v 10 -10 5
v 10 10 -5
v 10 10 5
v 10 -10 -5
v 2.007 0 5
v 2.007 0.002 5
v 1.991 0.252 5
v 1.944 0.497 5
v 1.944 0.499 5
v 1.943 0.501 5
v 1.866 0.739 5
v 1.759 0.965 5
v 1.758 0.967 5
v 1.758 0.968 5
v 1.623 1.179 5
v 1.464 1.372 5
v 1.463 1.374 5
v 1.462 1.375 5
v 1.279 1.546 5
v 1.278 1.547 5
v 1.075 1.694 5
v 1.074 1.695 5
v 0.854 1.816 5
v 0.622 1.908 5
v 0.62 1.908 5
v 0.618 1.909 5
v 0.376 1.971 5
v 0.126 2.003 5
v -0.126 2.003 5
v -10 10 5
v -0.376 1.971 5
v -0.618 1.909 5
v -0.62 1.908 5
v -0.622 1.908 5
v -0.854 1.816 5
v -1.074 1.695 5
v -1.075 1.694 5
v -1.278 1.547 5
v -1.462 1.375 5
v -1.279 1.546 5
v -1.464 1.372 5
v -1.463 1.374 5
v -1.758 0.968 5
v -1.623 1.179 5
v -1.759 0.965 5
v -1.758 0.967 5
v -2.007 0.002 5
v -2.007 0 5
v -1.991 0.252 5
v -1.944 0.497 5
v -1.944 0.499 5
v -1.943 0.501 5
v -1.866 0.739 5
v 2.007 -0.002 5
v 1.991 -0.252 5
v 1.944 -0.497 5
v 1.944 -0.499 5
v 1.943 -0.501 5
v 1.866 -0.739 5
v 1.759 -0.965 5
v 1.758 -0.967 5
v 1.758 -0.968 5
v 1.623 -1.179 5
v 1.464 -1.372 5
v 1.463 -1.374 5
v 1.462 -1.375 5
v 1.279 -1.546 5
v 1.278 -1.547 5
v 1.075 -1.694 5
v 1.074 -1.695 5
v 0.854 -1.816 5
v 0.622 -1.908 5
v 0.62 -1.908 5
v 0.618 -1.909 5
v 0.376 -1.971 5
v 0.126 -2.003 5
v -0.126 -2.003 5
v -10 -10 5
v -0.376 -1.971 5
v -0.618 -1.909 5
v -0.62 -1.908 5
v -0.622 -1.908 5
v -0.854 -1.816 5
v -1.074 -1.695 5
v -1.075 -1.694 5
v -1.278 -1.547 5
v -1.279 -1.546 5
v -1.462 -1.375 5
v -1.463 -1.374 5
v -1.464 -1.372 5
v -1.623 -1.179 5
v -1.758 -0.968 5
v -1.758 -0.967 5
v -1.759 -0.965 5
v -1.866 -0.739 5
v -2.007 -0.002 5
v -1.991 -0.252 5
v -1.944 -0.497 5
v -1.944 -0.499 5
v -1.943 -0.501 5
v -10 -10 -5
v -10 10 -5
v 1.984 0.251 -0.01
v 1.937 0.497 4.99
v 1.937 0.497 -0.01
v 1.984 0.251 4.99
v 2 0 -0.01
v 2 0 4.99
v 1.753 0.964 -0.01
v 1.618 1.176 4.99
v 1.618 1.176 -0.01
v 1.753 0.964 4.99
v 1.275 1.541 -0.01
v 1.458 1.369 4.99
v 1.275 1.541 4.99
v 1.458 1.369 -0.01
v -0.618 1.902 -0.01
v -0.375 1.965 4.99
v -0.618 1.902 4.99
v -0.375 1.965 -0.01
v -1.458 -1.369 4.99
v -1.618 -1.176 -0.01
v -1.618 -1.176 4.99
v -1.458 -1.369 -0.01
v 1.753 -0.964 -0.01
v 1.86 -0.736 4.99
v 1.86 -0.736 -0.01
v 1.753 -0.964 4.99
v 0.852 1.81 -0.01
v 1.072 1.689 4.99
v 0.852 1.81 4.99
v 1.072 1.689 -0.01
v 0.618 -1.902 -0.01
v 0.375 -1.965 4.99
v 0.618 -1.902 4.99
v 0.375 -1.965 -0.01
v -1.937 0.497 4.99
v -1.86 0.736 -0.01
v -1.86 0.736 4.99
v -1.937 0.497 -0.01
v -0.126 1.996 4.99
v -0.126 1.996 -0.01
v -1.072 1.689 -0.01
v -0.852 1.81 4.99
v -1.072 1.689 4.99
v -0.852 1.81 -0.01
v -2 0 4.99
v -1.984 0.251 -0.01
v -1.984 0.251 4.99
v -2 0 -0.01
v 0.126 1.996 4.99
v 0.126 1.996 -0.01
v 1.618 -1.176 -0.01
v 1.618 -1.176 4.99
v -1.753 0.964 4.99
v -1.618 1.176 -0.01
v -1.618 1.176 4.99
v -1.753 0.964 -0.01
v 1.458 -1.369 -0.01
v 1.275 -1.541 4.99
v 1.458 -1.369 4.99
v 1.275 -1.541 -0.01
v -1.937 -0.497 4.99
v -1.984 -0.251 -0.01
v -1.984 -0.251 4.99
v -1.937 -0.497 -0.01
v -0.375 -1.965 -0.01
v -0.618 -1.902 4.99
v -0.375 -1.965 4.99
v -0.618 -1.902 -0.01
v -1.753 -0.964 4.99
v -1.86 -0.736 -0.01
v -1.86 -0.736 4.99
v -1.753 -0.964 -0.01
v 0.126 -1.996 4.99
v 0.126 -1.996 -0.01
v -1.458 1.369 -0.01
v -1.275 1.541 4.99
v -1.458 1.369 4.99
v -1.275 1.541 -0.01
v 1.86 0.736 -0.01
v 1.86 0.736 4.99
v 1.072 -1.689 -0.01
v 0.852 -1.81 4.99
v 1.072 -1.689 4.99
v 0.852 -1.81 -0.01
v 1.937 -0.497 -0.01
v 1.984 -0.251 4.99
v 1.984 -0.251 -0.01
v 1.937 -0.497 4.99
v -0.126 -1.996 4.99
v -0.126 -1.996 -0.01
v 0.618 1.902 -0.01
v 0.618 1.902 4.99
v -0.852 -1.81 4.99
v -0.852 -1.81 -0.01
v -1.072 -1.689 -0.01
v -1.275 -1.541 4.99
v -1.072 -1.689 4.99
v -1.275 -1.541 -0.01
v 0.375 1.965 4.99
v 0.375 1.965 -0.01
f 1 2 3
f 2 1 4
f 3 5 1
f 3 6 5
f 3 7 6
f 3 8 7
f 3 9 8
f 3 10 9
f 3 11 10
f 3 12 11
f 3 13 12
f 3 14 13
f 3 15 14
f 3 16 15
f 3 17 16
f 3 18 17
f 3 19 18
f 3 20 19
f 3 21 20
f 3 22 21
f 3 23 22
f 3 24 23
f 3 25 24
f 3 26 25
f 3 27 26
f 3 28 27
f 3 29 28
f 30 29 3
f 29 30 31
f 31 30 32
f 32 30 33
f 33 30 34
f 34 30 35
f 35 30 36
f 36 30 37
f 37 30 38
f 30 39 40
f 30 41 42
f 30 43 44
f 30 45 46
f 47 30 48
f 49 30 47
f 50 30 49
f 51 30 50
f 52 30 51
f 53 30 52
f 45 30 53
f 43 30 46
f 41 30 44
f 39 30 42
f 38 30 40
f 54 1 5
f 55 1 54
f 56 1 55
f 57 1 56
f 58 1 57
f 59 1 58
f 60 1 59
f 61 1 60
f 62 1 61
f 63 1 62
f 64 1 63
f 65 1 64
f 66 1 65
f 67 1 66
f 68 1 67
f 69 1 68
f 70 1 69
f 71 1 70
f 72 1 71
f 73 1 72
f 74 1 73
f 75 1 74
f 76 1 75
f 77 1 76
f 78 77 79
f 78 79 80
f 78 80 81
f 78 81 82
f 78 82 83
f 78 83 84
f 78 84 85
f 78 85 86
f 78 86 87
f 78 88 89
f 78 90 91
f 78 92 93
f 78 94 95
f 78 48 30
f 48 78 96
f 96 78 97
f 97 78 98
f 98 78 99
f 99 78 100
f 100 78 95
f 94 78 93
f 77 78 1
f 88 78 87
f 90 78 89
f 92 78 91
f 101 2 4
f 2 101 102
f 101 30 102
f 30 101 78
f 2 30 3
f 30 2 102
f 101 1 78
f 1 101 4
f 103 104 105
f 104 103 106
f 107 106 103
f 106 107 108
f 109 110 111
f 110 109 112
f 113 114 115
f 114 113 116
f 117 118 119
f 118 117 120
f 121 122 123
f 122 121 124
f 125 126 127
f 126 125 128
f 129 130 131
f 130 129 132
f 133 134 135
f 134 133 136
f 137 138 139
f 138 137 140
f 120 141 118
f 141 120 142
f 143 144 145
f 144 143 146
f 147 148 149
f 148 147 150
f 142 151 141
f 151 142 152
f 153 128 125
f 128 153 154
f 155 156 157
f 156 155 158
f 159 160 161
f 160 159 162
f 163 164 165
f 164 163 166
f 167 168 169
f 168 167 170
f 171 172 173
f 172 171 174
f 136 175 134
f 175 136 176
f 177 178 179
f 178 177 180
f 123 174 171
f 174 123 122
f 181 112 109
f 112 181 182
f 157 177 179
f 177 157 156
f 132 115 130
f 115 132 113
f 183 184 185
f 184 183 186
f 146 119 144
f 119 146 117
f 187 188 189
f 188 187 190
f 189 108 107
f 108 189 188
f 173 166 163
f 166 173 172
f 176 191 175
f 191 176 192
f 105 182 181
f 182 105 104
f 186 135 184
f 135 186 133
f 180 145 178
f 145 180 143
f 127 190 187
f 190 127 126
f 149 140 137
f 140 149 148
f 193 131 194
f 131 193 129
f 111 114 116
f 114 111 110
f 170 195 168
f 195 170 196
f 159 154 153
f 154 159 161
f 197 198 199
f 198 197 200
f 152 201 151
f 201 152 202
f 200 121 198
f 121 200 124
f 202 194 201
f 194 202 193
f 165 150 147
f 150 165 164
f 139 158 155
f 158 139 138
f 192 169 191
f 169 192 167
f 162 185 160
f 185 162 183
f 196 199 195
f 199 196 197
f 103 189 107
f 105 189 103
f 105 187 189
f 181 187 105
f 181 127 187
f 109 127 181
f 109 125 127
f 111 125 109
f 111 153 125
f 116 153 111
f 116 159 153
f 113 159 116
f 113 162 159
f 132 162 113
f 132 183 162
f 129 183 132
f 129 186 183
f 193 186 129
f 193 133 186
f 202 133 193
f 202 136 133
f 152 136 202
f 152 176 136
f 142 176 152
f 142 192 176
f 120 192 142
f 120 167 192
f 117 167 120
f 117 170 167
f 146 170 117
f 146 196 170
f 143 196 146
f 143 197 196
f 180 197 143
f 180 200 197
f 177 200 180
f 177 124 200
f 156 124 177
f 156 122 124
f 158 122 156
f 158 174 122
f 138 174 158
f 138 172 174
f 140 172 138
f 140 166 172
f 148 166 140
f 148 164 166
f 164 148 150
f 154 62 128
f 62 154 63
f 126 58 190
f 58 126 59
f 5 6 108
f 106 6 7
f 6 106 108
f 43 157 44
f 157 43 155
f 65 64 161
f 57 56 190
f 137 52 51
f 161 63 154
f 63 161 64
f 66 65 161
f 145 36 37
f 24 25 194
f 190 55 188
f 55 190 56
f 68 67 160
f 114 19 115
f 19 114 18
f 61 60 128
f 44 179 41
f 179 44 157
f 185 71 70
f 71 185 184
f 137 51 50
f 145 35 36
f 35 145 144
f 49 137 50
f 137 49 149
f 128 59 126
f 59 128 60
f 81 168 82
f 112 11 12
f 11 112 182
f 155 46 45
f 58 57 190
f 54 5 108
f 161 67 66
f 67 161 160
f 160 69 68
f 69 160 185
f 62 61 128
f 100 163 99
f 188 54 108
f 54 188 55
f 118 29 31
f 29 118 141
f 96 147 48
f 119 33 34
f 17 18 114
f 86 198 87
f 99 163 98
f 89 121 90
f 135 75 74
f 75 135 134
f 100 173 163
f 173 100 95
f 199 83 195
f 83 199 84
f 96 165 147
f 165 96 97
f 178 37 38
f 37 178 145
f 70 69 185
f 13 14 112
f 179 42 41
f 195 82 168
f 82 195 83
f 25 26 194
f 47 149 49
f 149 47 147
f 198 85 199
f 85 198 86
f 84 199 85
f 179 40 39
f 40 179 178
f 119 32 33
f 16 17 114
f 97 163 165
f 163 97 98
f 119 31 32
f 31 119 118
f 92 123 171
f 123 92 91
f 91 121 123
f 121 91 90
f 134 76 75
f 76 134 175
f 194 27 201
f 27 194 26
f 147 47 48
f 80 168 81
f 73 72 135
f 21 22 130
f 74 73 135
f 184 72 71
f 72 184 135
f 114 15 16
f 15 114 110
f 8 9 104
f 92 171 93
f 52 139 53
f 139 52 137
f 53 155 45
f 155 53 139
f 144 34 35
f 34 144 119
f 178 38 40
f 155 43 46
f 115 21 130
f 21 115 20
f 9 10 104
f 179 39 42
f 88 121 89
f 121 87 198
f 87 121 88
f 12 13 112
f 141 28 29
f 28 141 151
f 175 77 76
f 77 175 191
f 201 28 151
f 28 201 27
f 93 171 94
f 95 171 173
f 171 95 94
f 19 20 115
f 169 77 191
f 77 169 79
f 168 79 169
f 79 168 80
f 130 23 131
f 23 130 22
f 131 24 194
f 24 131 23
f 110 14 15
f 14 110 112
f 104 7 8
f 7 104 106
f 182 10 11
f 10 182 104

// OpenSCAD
// Countersunk Hole Example
// Hole with angled top for flat-head screws

eps = 0.01;
$fn = 50;

difference() {
    cube([20, 20, 10], center=true);
    
    // Main hole (shaft)
    translate([0, 0, -eps])
        cylinder(h=10+2*eps, r=2);
    
    // Countersink (cone for screw head)
    translate([0, 0, 5-eps])
        cylinder(h=3, r1=2, r2=4);
}
